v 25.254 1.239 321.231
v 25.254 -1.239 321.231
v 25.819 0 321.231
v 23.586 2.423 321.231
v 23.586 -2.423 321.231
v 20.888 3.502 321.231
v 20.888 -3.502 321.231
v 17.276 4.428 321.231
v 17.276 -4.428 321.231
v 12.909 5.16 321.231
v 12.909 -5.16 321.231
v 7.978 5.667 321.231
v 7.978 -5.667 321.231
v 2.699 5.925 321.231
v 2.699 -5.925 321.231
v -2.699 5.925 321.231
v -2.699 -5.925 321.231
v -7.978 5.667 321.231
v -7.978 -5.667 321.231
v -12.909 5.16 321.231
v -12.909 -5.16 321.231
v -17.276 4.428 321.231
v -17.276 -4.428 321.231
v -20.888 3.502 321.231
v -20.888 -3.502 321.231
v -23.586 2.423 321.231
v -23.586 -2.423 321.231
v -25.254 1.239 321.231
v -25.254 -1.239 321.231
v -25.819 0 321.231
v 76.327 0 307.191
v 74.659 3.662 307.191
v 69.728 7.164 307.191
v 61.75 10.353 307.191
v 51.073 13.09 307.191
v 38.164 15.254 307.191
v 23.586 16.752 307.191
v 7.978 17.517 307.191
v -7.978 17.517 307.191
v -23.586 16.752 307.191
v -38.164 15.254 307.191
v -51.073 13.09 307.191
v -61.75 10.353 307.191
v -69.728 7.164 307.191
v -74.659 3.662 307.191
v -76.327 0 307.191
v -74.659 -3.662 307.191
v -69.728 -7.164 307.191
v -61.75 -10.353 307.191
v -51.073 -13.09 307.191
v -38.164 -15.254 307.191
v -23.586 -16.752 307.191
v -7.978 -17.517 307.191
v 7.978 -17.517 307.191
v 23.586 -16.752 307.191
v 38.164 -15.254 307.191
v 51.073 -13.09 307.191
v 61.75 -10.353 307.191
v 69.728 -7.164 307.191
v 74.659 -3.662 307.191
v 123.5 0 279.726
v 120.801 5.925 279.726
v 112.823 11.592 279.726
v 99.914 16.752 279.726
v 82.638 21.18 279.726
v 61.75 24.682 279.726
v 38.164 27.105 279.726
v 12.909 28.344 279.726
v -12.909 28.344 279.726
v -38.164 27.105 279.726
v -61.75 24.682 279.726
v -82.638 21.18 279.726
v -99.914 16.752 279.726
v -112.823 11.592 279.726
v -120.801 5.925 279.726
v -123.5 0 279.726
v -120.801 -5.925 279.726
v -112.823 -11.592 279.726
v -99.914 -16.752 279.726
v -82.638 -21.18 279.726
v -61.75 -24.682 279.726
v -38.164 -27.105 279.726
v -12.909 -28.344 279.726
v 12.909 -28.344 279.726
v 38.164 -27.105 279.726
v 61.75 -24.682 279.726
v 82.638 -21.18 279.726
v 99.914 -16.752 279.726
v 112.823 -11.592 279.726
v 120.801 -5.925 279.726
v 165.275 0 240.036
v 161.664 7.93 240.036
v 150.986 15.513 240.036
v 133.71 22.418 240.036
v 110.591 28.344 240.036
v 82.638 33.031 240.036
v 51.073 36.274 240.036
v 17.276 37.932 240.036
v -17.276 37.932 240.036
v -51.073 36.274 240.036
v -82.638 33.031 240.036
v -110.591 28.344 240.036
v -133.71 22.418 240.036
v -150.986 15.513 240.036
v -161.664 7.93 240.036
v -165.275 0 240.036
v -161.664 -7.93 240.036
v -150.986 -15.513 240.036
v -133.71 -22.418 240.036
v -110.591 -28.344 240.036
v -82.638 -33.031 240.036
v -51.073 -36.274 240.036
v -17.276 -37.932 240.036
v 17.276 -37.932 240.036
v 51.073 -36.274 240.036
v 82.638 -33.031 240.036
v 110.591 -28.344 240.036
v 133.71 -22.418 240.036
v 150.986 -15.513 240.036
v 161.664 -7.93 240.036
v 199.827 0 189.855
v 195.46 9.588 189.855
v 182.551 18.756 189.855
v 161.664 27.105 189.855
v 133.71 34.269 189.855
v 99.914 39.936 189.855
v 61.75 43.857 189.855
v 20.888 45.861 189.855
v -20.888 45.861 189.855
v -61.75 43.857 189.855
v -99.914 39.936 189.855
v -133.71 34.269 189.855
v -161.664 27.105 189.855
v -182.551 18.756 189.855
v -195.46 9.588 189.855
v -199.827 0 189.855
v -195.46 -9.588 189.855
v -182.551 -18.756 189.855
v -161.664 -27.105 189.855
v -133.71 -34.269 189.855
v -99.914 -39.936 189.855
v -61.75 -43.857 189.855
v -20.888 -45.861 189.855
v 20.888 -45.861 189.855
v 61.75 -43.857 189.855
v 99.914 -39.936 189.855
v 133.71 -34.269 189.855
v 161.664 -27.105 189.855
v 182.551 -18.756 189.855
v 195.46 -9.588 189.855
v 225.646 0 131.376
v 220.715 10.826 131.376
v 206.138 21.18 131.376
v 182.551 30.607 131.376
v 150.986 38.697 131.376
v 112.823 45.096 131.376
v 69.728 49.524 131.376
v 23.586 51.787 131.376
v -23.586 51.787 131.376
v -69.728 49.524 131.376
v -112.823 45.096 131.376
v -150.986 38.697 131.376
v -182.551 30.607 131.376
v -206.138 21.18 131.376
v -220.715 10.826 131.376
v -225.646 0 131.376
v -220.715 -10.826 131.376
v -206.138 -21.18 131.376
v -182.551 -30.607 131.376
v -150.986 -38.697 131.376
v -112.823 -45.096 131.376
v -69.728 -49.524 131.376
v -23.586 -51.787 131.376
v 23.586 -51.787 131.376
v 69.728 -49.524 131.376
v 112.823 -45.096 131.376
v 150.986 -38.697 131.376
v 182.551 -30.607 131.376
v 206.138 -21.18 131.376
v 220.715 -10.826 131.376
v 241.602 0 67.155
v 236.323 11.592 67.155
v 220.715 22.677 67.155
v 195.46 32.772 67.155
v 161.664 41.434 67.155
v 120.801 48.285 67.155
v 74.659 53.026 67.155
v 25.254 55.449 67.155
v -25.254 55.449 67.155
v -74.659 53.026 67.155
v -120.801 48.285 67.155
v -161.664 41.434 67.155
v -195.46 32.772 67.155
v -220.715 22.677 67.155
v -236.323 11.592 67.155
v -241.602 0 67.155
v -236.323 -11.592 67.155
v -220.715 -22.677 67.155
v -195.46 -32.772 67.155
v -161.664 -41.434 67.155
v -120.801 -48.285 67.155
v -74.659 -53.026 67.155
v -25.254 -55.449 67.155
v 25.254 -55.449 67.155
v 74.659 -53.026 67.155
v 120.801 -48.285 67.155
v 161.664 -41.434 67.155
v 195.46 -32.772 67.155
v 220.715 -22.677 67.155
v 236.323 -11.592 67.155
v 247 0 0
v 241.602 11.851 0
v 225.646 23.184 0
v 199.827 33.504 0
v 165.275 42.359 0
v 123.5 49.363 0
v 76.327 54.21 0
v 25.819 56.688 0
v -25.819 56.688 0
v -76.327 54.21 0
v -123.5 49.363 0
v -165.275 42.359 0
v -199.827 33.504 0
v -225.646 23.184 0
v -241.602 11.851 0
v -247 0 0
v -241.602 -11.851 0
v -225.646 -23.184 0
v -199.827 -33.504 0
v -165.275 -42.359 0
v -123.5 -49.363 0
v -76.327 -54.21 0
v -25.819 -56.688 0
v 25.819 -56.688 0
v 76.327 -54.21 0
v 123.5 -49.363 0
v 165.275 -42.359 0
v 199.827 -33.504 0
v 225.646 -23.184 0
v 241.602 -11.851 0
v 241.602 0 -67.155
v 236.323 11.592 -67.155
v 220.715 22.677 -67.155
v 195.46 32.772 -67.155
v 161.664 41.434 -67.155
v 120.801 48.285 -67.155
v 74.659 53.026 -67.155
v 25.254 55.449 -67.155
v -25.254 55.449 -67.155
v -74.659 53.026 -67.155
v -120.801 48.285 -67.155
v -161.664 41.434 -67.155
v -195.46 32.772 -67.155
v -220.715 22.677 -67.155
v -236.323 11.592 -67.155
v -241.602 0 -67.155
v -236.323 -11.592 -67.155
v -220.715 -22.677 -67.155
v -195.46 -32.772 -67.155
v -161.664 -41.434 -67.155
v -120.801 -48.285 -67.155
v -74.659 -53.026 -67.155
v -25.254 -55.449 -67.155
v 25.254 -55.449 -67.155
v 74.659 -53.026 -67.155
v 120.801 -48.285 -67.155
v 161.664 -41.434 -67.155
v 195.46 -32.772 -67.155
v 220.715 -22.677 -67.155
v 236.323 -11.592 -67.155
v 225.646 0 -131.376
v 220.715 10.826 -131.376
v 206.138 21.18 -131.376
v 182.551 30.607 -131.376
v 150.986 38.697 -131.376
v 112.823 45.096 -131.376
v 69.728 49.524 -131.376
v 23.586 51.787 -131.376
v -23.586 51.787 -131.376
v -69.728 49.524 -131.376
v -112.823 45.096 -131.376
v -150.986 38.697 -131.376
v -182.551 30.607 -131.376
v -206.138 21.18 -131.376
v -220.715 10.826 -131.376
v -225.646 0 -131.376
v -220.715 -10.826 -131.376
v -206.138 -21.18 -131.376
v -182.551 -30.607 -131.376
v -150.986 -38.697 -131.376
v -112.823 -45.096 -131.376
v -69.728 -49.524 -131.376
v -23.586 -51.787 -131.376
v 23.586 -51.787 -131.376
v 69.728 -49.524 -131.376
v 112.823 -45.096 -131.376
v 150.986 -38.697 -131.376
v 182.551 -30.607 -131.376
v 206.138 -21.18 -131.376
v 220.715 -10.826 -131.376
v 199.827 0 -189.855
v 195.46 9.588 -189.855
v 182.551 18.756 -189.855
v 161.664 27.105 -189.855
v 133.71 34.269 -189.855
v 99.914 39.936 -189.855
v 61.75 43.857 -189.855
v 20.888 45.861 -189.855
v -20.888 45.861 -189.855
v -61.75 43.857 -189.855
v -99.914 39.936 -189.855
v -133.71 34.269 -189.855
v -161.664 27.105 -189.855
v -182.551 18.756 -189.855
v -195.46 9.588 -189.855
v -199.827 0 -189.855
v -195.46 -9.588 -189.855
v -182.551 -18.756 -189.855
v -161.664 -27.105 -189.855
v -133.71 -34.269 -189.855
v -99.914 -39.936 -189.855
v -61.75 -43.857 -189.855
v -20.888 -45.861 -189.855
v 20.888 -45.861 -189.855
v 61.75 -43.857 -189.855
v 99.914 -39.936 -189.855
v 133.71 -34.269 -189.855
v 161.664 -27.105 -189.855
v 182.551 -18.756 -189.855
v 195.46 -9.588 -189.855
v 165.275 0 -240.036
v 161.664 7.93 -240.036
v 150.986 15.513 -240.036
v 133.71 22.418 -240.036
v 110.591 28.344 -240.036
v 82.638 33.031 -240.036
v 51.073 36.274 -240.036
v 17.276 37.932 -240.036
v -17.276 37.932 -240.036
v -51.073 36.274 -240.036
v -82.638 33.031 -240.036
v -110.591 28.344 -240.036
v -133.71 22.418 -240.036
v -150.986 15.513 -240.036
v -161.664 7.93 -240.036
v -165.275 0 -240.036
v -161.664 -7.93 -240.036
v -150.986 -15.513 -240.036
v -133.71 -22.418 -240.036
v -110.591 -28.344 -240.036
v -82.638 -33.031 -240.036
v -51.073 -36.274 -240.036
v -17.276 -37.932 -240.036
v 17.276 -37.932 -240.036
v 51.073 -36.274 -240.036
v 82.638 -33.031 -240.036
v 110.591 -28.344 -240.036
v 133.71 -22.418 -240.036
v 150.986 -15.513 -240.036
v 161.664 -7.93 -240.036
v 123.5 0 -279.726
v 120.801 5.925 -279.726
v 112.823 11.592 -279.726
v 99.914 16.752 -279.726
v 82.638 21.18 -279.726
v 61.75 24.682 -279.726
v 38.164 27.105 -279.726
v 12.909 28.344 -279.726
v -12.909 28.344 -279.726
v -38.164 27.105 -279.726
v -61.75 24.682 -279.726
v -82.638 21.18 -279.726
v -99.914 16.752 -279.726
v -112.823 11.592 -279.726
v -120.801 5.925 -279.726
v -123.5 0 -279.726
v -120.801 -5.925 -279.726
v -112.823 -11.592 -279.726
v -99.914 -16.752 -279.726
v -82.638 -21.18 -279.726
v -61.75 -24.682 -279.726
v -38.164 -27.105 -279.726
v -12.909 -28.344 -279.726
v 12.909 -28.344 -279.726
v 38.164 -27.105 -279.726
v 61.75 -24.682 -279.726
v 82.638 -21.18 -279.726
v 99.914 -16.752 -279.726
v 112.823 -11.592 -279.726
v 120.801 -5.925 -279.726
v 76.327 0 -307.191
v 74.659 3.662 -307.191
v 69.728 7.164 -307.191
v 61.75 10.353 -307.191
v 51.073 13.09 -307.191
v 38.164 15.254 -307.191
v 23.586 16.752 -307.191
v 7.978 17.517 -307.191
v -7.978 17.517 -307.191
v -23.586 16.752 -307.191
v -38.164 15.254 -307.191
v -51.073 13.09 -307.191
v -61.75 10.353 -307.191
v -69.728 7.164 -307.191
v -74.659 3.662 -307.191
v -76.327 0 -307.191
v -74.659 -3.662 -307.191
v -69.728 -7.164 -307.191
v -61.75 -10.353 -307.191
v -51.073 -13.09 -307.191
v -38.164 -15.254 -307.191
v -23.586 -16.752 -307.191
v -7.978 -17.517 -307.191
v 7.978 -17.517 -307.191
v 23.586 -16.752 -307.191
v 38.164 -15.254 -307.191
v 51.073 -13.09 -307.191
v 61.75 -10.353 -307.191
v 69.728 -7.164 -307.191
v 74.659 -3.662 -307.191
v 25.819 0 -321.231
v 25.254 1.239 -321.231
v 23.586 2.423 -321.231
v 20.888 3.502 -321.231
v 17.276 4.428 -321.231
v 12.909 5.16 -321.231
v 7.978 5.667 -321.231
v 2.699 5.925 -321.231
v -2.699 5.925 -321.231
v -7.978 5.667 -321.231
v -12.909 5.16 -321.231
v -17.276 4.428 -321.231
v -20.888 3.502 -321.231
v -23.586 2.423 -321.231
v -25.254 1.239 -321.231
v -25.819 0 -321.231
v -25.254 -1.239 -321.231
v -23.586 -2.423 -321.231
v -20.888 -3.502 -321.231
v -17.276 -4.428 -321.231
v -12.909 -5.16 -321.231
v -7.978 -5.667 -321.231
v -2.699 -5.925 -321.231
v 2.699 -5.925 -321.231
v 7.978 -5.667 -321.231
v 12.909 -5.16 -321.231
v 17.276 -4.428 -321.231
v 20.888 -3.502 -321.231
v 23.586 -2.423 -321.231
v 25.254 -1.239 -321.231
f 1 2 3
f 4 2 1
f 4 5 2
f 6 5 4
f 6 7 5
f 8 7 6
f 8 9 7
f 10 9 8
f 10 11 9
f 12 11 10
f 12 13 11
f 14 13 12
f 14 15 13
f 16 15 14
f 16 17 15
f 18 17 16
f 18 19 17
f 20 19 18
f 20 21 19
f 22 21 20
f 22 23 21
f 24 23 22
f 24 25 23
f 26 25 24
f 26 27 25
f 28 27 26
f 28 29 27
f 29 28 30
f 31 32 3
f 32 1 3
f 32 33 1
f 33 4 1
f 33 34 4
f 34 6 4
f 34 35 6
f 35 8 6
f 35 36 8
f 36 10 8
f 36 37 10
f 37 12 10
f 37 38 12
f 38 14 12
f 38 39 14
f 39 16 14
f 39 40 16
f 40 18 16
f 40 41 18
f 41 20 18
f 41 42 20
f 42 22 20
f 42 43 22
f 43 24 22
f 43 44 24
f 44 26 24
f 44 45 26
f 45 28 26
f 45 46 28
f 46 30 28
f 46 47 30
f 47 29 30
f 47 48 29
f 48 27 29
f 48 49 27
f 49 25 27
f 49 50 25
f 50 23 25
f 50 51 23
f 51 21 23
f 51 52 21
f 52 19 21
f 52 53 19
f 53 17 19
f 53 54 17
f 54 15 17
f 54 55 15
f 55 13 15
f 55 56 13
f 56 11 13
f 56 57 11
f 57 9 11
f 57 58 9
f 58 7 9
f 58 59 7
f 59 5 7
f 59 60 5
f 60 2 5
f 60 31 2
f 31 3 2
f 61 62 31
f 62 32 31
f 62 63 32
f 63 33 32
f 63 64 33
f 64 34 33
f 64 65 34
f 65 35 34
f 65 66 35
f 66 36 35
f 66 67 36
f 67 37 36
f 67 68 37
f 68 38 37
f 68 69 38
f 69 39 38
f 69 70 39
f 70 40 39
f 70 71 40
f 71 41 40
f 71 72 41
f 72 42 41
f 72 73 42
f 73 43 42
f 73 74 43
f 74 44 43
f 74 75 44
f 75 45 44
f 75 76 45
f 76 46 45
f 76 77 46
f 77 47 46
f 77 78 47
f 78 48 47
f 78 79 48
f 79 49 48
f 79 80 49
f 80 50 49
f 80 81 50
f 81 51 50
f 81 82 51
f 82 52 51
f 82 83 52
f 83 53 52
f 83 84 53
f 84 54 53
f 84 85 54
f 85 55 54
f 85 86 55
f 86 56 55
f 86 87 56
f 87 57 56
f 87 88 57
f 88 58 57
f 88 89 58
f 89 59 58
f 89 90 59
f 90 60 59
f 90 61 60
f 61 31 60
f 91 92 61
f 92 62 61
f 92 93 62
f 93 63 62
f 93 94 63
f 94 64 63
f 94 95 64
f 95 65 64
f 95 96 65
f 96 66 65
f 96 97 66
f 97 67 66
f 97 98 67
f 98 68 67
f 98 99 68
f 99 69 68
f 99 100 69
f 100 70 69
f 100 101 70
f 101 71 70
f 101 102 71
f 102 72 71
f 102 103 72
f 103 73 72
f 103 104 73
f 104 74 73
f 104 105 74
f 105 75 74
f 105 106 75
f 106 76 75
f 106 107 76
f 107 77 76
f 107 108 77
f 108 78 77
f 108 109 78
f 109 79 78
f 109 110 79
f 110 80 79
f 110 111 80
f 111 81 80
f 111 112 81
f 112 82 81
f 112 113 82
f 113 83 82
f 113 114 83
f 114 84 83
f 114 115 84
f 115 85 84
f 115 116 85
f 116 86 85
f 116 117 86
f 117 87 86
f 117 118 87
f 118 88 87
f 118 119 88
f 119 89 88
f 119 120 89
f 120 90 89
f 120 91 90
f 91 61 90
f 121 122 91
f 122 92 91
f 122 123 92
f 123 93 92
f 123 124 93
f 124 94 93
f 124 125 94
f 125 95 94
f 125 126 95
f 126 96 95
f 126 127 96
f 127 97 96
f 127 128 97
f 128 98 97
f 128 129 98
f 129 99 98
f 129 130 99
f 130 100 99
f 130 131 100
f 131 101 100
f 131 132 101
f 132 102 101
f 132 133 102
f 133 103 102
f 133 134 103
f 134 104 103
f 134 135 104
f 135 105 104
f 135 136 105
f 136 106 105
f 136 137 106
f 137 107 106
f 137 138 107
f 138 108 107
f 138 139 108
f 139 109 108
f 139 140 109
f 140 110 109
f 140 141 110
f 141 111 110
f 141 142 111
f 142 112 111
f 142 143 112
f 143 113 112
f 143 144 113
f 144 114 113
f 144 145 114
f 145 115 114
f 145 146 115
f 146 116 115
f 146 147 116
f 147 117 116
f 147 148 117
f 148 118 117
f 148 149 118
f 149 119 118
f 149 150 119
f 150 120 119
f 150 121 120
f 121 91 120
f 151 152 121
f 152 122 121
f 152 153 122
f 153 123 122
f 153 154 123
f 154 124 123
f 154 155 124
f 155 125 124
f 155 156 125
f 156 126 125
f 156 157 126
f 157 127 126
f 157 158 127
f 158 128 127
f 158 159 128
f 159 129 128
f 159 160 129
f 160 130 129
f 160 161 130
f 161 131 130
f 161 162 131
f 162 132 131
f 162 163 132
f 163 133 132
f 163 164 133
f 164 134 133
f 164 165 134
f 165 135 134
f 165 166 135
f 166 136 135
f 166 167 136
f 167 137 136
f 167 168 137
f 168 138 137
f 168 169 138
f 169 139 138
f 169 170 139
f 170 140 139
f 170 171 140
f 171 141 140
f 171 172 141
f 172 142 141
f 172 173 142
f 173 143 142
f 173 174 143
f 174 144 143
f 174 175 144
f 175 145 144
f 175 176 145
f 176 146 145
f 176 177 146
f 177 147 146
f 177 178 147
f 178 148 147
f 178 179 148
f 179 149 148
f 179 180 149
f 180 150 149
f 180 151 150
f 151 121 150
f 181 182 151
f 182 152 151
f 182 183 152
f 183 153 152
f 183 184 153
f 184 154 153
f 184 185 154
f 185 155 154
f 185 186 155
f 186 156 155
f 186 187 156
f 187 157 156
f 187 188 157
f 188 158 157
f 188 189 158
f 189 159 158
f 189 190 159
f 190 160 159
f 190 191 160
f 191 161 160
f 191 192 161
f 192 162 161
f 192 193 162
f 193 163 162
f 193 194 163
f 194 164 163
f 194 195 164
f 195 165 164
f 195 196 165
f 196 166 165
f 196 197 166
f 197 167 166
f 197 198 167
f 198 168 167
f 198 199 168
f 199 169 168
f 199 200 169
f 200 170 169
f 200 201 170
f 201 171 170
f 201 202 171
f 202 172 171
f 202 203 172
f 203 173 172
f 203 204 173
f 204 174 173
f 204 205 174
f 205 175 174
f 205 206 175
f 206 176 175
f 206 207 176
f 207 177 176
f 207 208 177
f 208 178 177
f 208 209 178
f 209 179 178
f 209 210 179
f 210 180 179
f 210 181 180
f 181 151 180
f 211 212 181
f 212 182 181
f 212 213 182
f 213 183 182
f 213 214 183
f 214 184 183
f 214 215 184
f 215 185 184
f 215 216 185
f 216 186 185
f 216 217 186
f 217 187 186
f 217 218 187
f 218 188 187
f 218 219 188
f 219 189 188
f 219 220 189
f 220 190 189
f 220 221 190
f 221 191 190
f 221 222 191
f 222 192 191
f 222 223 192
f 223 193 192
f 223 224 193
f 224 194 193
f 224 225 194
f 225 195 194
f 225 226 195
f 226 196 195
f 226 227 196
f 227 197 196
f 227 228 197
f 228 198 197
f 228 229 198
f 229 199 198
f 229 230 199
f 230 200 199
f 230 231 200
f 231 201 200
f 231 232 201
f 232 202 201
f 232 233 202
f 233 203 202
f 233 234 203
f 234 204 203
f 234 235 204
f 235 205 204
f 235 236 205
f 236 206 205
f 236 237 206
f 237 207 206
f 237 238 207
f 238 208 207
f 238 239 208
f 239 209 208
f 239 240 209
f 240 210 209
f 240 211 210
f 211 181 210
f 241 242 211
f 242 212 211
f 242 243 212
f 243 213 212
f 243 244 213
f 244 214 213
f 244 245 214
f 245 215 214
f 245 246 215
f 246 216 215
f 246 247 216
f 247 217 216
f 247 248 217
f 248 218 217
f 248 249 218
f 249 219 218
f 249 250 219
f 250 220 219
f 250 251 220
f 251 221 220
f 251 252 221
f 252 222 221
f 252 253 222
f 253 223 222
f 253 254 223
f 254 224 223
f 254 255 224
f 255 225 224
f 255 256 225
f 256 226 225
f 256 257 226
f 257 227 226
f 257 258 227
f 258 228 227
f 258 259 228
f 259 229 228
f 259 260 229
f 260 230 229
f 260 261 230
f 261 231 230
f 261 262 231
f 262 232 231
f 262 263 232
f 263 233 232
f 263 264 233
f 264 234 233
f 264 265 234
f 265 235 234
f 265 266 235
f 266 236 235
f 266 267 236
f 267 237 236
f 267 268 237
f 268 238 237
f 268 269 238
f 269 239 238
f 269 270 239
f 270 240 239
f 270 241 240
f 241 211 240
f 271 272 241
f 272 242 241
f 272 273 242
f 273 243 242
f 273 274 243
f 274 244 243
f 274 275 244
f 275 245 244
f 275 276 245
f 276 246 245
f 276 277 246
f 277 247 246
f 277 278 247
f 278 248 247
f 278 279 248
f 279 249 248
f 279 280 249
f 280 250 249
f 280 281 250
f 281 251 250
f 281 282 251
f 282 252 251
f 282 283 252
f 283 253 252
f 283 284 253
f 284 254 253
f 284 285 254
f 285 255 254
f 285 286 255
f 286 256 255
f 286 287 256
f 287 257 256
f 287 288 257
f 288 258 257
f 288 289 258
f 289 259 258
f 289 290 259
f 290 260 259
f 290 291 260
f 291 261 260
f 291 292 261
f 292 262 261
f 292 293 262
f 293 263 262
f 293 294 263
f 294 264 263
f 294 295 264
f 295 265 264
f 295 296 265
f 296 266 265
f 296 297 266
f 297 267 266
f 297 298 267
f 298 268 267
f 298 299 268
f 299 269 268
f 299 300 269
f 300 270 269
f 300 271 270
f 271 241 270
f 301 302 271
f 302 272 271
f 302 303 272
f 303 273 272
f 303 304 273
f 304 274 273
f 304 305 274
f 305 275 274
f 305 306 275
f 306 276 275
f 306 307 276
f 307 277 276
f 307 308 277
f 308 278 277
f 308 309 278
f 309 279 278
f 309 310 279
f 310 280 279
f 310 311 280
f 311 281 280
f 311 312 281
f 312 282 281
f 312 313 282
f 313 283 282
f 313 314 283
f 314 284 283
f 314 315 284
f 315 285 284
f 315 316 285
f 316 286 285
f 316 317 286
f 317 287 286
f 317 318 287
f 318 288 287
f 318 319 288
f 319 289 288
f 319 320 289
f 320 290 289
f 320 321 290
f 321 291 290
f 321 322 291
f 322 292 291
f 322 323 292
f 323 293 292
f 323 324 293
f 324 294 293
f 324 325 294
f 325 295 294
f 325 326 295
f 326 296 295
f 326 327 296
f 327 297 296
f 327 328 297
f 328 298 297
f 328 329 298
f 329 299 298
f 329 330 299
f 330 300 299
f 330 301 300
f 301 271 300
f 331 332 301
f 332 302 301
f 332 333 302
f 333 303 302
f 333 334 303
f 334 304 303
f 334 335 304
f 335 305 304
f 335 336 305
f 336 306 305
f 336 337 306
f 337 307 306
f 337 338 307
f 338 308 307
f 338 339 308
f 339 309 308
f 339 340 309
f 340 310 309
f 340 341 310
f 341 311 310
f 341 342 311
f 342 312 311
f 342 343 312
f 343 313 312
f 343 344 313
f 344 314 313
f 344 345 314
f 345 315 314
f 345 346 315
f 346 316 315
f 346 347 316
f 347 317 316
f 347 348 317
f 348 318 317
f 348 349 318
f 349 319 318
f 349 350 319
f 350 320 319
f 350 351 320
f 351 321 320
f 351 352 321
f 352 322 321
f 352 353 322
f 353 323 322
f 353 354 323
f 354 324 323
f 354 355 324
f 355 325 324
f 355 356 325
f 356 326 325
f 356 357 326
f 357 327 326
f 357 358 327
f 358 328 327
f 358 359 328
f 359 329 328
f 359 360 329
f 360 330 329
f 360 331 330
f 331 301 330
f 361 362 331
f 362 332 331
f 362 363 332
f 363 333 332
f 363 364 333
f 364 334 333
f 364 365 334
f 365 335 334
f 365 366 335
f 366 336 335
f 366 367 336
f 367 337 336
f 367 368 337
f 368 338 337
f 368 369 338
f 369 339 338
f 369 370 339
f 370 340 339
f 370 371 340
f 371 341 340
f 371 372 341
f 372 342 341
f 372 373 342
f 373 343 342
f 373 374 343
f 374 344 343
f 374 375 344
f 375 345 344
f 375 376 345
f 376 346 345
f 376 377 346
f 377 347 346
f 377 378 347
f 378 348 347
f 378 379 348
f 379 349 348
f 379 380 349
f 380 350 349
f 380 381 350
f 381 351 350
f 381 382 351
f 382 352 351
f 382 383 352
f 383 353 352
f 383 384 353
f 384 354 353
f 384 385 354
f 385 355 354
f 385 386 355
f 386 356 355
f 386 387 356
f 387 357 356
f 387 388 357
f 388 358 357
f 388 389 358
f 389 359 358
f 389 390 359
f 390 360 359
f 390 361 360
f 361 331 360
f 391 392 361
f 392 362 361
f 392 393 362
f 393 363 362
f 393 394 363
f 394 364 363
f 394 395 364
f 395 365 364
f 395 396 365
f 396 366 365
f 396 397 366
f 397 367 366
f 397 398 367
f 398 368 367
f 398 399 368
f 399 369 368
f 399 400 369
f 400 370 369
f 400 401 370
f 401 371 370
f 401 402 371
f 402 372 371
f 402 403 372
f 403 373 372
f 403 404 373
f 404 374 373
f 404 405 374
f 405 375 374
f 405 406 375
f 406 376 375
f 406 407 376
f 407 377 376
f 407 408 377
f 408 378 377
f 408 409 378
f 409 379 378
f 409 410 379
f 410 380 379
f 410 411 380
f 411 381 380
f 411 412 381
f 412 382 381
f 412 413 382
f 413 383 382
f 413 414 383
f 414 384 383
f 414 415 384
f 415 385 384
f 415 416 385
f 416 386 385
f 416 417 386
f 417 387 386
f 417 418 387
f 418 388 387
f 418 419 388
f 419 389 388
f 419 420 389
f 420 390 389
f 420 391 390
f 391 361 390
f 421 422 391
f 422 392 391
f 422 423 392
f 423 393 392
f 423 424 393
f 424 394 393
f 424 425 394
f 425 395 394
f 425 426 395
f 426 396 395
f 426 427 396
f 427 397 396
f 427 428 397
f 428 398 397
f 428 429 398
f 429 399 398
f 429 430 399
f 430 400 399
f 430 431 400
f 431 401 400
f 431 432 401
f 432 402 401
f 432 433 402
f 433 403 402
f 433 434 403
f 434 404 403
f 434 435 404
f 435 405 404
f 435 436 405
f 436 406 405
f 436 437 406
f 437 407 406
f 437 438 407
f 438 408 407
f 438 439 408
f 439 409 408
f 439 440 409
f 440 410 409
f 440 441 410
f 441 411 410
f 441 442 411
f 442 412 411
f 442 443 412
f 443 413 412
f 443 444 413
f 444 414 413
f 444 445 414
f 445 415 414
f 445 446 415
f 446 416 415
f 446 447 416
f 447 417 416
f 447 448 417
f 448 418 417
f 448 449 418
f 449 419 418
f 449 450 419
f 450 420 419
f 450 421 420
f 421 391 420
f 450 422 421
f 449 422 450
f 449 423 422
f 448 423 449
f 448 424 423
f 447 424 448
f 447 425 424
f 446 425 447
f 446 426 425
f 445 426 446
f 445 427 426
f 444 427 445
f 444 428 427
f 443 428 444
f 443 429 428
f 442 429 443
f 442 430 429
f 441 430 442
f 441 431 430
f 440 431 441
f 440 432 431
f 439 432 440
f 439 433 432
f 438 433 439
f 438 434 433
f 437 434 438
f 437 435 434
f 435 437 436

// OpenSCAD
// Generated by SolidPython 1.0.1 on 2020-07-29 00:46:50


scale(v = [13, 3, 17]) {
	sphere(r = 19);
}
/***********************************************
*********      SolidPython code:      **********
************************************************
 
# import packages: SolidPython
from solid import *
from solid.utils import *
from itertools import chain, combinations, permutations


class Resize:

    def __init__(self, scad_file):
        self.scad_file = scad_file
        #self.scad_file = import_scad(scad_file)
        # cone/cylinder param:
        self.r1 = 0
        self.r2 = 0
        self.h = 0
        # rectangular prism param:
        self.w = 0
        self.l = 0
        # ellipse param:
        self.r = 0

    # import OpenScad code (file name corresponds to shape)


    # classify shape + parameters
    def assign(self, param1, param2, param3):
        if self.scad_file == 'cone.scad':
            self.r1 = param1
            self.r2 = param2
            self.h = param3
        elif self.scad_file == 'cylinder.scad':
            self.r1 = param1
            self.r2 = param2
            self.h = param3
        elif self.scad_file == 'rectangularPrism.scad':
            self.h = param1
            self.l = param2
            self.w = param3
        else:
            self.r = param1
            self.h = param2

    # resize parameters
    def iterate(self):
        x = range(3, 20, 2)
        i = 1
        if self.scad_file == 'cone.scad':
            tempList = list(permutations(x, 2))
            for temp in tempList:
                param1 = temp[0]
                param2 = temp[1]
                filepath = 'produced_scad_files/' + 'cone' + str(param1) + '_' + str(param2) + '_' + '.scad'
                scad_render_to_file(cylinder(h=param1, r1=param2, r2=0), filepath)

        elif self.scad_file == 'cylinder.scad':
            tempList = list(permutations(x, 3))
            for temp in tempList:
                param1 = temp[0]
                param2 = temp[1]
                filepath = 'produced_scad_files/' + 'cylinder' + str(param1) + '_' + str(param2) + '_' + '.scad'
                scad_render_to_file(cylinder(h=param1, r1=param2, r2=param2), filepath)

        elif self.scad_file == 'rectangularPrism.scad':
            tempList = list(permutations(x, 3))
            for temp in tempList:
                param1 = temp[0]
                param2 = temp[1]
                param3 = temp[2]
                filepath = 'produced_scad_files/' + 'rectangularPrism' + str(param1) + '_' + str(param2) + '_' + str(
                    param3) + '.scad'
                scad_render_to_file(cube(size=(param1, param2, param3)), filepath)

        elif self.scad_file == 'ellipse.scad':
            tempList = list(permutations(x, 4))
            for temp in tempList:
                param1 = temp[0]
                param2 = temp[1]
                param3 = temp[2]
                param4 = temp[3]
                filepath = 'produced_scad_files/' + 'ellipse' + str(param1) + '_' + str(param2) + '_' + str(param3) + '_' + str(param4) + '.scad'
                scad_render_to_file(scale([param1, param2, param3])(sphere(r=param4)), filepath)

    def render_to_scadfile(self):
        scad_render_to_file(scad, 'example.scad') 
 
************************************************/
